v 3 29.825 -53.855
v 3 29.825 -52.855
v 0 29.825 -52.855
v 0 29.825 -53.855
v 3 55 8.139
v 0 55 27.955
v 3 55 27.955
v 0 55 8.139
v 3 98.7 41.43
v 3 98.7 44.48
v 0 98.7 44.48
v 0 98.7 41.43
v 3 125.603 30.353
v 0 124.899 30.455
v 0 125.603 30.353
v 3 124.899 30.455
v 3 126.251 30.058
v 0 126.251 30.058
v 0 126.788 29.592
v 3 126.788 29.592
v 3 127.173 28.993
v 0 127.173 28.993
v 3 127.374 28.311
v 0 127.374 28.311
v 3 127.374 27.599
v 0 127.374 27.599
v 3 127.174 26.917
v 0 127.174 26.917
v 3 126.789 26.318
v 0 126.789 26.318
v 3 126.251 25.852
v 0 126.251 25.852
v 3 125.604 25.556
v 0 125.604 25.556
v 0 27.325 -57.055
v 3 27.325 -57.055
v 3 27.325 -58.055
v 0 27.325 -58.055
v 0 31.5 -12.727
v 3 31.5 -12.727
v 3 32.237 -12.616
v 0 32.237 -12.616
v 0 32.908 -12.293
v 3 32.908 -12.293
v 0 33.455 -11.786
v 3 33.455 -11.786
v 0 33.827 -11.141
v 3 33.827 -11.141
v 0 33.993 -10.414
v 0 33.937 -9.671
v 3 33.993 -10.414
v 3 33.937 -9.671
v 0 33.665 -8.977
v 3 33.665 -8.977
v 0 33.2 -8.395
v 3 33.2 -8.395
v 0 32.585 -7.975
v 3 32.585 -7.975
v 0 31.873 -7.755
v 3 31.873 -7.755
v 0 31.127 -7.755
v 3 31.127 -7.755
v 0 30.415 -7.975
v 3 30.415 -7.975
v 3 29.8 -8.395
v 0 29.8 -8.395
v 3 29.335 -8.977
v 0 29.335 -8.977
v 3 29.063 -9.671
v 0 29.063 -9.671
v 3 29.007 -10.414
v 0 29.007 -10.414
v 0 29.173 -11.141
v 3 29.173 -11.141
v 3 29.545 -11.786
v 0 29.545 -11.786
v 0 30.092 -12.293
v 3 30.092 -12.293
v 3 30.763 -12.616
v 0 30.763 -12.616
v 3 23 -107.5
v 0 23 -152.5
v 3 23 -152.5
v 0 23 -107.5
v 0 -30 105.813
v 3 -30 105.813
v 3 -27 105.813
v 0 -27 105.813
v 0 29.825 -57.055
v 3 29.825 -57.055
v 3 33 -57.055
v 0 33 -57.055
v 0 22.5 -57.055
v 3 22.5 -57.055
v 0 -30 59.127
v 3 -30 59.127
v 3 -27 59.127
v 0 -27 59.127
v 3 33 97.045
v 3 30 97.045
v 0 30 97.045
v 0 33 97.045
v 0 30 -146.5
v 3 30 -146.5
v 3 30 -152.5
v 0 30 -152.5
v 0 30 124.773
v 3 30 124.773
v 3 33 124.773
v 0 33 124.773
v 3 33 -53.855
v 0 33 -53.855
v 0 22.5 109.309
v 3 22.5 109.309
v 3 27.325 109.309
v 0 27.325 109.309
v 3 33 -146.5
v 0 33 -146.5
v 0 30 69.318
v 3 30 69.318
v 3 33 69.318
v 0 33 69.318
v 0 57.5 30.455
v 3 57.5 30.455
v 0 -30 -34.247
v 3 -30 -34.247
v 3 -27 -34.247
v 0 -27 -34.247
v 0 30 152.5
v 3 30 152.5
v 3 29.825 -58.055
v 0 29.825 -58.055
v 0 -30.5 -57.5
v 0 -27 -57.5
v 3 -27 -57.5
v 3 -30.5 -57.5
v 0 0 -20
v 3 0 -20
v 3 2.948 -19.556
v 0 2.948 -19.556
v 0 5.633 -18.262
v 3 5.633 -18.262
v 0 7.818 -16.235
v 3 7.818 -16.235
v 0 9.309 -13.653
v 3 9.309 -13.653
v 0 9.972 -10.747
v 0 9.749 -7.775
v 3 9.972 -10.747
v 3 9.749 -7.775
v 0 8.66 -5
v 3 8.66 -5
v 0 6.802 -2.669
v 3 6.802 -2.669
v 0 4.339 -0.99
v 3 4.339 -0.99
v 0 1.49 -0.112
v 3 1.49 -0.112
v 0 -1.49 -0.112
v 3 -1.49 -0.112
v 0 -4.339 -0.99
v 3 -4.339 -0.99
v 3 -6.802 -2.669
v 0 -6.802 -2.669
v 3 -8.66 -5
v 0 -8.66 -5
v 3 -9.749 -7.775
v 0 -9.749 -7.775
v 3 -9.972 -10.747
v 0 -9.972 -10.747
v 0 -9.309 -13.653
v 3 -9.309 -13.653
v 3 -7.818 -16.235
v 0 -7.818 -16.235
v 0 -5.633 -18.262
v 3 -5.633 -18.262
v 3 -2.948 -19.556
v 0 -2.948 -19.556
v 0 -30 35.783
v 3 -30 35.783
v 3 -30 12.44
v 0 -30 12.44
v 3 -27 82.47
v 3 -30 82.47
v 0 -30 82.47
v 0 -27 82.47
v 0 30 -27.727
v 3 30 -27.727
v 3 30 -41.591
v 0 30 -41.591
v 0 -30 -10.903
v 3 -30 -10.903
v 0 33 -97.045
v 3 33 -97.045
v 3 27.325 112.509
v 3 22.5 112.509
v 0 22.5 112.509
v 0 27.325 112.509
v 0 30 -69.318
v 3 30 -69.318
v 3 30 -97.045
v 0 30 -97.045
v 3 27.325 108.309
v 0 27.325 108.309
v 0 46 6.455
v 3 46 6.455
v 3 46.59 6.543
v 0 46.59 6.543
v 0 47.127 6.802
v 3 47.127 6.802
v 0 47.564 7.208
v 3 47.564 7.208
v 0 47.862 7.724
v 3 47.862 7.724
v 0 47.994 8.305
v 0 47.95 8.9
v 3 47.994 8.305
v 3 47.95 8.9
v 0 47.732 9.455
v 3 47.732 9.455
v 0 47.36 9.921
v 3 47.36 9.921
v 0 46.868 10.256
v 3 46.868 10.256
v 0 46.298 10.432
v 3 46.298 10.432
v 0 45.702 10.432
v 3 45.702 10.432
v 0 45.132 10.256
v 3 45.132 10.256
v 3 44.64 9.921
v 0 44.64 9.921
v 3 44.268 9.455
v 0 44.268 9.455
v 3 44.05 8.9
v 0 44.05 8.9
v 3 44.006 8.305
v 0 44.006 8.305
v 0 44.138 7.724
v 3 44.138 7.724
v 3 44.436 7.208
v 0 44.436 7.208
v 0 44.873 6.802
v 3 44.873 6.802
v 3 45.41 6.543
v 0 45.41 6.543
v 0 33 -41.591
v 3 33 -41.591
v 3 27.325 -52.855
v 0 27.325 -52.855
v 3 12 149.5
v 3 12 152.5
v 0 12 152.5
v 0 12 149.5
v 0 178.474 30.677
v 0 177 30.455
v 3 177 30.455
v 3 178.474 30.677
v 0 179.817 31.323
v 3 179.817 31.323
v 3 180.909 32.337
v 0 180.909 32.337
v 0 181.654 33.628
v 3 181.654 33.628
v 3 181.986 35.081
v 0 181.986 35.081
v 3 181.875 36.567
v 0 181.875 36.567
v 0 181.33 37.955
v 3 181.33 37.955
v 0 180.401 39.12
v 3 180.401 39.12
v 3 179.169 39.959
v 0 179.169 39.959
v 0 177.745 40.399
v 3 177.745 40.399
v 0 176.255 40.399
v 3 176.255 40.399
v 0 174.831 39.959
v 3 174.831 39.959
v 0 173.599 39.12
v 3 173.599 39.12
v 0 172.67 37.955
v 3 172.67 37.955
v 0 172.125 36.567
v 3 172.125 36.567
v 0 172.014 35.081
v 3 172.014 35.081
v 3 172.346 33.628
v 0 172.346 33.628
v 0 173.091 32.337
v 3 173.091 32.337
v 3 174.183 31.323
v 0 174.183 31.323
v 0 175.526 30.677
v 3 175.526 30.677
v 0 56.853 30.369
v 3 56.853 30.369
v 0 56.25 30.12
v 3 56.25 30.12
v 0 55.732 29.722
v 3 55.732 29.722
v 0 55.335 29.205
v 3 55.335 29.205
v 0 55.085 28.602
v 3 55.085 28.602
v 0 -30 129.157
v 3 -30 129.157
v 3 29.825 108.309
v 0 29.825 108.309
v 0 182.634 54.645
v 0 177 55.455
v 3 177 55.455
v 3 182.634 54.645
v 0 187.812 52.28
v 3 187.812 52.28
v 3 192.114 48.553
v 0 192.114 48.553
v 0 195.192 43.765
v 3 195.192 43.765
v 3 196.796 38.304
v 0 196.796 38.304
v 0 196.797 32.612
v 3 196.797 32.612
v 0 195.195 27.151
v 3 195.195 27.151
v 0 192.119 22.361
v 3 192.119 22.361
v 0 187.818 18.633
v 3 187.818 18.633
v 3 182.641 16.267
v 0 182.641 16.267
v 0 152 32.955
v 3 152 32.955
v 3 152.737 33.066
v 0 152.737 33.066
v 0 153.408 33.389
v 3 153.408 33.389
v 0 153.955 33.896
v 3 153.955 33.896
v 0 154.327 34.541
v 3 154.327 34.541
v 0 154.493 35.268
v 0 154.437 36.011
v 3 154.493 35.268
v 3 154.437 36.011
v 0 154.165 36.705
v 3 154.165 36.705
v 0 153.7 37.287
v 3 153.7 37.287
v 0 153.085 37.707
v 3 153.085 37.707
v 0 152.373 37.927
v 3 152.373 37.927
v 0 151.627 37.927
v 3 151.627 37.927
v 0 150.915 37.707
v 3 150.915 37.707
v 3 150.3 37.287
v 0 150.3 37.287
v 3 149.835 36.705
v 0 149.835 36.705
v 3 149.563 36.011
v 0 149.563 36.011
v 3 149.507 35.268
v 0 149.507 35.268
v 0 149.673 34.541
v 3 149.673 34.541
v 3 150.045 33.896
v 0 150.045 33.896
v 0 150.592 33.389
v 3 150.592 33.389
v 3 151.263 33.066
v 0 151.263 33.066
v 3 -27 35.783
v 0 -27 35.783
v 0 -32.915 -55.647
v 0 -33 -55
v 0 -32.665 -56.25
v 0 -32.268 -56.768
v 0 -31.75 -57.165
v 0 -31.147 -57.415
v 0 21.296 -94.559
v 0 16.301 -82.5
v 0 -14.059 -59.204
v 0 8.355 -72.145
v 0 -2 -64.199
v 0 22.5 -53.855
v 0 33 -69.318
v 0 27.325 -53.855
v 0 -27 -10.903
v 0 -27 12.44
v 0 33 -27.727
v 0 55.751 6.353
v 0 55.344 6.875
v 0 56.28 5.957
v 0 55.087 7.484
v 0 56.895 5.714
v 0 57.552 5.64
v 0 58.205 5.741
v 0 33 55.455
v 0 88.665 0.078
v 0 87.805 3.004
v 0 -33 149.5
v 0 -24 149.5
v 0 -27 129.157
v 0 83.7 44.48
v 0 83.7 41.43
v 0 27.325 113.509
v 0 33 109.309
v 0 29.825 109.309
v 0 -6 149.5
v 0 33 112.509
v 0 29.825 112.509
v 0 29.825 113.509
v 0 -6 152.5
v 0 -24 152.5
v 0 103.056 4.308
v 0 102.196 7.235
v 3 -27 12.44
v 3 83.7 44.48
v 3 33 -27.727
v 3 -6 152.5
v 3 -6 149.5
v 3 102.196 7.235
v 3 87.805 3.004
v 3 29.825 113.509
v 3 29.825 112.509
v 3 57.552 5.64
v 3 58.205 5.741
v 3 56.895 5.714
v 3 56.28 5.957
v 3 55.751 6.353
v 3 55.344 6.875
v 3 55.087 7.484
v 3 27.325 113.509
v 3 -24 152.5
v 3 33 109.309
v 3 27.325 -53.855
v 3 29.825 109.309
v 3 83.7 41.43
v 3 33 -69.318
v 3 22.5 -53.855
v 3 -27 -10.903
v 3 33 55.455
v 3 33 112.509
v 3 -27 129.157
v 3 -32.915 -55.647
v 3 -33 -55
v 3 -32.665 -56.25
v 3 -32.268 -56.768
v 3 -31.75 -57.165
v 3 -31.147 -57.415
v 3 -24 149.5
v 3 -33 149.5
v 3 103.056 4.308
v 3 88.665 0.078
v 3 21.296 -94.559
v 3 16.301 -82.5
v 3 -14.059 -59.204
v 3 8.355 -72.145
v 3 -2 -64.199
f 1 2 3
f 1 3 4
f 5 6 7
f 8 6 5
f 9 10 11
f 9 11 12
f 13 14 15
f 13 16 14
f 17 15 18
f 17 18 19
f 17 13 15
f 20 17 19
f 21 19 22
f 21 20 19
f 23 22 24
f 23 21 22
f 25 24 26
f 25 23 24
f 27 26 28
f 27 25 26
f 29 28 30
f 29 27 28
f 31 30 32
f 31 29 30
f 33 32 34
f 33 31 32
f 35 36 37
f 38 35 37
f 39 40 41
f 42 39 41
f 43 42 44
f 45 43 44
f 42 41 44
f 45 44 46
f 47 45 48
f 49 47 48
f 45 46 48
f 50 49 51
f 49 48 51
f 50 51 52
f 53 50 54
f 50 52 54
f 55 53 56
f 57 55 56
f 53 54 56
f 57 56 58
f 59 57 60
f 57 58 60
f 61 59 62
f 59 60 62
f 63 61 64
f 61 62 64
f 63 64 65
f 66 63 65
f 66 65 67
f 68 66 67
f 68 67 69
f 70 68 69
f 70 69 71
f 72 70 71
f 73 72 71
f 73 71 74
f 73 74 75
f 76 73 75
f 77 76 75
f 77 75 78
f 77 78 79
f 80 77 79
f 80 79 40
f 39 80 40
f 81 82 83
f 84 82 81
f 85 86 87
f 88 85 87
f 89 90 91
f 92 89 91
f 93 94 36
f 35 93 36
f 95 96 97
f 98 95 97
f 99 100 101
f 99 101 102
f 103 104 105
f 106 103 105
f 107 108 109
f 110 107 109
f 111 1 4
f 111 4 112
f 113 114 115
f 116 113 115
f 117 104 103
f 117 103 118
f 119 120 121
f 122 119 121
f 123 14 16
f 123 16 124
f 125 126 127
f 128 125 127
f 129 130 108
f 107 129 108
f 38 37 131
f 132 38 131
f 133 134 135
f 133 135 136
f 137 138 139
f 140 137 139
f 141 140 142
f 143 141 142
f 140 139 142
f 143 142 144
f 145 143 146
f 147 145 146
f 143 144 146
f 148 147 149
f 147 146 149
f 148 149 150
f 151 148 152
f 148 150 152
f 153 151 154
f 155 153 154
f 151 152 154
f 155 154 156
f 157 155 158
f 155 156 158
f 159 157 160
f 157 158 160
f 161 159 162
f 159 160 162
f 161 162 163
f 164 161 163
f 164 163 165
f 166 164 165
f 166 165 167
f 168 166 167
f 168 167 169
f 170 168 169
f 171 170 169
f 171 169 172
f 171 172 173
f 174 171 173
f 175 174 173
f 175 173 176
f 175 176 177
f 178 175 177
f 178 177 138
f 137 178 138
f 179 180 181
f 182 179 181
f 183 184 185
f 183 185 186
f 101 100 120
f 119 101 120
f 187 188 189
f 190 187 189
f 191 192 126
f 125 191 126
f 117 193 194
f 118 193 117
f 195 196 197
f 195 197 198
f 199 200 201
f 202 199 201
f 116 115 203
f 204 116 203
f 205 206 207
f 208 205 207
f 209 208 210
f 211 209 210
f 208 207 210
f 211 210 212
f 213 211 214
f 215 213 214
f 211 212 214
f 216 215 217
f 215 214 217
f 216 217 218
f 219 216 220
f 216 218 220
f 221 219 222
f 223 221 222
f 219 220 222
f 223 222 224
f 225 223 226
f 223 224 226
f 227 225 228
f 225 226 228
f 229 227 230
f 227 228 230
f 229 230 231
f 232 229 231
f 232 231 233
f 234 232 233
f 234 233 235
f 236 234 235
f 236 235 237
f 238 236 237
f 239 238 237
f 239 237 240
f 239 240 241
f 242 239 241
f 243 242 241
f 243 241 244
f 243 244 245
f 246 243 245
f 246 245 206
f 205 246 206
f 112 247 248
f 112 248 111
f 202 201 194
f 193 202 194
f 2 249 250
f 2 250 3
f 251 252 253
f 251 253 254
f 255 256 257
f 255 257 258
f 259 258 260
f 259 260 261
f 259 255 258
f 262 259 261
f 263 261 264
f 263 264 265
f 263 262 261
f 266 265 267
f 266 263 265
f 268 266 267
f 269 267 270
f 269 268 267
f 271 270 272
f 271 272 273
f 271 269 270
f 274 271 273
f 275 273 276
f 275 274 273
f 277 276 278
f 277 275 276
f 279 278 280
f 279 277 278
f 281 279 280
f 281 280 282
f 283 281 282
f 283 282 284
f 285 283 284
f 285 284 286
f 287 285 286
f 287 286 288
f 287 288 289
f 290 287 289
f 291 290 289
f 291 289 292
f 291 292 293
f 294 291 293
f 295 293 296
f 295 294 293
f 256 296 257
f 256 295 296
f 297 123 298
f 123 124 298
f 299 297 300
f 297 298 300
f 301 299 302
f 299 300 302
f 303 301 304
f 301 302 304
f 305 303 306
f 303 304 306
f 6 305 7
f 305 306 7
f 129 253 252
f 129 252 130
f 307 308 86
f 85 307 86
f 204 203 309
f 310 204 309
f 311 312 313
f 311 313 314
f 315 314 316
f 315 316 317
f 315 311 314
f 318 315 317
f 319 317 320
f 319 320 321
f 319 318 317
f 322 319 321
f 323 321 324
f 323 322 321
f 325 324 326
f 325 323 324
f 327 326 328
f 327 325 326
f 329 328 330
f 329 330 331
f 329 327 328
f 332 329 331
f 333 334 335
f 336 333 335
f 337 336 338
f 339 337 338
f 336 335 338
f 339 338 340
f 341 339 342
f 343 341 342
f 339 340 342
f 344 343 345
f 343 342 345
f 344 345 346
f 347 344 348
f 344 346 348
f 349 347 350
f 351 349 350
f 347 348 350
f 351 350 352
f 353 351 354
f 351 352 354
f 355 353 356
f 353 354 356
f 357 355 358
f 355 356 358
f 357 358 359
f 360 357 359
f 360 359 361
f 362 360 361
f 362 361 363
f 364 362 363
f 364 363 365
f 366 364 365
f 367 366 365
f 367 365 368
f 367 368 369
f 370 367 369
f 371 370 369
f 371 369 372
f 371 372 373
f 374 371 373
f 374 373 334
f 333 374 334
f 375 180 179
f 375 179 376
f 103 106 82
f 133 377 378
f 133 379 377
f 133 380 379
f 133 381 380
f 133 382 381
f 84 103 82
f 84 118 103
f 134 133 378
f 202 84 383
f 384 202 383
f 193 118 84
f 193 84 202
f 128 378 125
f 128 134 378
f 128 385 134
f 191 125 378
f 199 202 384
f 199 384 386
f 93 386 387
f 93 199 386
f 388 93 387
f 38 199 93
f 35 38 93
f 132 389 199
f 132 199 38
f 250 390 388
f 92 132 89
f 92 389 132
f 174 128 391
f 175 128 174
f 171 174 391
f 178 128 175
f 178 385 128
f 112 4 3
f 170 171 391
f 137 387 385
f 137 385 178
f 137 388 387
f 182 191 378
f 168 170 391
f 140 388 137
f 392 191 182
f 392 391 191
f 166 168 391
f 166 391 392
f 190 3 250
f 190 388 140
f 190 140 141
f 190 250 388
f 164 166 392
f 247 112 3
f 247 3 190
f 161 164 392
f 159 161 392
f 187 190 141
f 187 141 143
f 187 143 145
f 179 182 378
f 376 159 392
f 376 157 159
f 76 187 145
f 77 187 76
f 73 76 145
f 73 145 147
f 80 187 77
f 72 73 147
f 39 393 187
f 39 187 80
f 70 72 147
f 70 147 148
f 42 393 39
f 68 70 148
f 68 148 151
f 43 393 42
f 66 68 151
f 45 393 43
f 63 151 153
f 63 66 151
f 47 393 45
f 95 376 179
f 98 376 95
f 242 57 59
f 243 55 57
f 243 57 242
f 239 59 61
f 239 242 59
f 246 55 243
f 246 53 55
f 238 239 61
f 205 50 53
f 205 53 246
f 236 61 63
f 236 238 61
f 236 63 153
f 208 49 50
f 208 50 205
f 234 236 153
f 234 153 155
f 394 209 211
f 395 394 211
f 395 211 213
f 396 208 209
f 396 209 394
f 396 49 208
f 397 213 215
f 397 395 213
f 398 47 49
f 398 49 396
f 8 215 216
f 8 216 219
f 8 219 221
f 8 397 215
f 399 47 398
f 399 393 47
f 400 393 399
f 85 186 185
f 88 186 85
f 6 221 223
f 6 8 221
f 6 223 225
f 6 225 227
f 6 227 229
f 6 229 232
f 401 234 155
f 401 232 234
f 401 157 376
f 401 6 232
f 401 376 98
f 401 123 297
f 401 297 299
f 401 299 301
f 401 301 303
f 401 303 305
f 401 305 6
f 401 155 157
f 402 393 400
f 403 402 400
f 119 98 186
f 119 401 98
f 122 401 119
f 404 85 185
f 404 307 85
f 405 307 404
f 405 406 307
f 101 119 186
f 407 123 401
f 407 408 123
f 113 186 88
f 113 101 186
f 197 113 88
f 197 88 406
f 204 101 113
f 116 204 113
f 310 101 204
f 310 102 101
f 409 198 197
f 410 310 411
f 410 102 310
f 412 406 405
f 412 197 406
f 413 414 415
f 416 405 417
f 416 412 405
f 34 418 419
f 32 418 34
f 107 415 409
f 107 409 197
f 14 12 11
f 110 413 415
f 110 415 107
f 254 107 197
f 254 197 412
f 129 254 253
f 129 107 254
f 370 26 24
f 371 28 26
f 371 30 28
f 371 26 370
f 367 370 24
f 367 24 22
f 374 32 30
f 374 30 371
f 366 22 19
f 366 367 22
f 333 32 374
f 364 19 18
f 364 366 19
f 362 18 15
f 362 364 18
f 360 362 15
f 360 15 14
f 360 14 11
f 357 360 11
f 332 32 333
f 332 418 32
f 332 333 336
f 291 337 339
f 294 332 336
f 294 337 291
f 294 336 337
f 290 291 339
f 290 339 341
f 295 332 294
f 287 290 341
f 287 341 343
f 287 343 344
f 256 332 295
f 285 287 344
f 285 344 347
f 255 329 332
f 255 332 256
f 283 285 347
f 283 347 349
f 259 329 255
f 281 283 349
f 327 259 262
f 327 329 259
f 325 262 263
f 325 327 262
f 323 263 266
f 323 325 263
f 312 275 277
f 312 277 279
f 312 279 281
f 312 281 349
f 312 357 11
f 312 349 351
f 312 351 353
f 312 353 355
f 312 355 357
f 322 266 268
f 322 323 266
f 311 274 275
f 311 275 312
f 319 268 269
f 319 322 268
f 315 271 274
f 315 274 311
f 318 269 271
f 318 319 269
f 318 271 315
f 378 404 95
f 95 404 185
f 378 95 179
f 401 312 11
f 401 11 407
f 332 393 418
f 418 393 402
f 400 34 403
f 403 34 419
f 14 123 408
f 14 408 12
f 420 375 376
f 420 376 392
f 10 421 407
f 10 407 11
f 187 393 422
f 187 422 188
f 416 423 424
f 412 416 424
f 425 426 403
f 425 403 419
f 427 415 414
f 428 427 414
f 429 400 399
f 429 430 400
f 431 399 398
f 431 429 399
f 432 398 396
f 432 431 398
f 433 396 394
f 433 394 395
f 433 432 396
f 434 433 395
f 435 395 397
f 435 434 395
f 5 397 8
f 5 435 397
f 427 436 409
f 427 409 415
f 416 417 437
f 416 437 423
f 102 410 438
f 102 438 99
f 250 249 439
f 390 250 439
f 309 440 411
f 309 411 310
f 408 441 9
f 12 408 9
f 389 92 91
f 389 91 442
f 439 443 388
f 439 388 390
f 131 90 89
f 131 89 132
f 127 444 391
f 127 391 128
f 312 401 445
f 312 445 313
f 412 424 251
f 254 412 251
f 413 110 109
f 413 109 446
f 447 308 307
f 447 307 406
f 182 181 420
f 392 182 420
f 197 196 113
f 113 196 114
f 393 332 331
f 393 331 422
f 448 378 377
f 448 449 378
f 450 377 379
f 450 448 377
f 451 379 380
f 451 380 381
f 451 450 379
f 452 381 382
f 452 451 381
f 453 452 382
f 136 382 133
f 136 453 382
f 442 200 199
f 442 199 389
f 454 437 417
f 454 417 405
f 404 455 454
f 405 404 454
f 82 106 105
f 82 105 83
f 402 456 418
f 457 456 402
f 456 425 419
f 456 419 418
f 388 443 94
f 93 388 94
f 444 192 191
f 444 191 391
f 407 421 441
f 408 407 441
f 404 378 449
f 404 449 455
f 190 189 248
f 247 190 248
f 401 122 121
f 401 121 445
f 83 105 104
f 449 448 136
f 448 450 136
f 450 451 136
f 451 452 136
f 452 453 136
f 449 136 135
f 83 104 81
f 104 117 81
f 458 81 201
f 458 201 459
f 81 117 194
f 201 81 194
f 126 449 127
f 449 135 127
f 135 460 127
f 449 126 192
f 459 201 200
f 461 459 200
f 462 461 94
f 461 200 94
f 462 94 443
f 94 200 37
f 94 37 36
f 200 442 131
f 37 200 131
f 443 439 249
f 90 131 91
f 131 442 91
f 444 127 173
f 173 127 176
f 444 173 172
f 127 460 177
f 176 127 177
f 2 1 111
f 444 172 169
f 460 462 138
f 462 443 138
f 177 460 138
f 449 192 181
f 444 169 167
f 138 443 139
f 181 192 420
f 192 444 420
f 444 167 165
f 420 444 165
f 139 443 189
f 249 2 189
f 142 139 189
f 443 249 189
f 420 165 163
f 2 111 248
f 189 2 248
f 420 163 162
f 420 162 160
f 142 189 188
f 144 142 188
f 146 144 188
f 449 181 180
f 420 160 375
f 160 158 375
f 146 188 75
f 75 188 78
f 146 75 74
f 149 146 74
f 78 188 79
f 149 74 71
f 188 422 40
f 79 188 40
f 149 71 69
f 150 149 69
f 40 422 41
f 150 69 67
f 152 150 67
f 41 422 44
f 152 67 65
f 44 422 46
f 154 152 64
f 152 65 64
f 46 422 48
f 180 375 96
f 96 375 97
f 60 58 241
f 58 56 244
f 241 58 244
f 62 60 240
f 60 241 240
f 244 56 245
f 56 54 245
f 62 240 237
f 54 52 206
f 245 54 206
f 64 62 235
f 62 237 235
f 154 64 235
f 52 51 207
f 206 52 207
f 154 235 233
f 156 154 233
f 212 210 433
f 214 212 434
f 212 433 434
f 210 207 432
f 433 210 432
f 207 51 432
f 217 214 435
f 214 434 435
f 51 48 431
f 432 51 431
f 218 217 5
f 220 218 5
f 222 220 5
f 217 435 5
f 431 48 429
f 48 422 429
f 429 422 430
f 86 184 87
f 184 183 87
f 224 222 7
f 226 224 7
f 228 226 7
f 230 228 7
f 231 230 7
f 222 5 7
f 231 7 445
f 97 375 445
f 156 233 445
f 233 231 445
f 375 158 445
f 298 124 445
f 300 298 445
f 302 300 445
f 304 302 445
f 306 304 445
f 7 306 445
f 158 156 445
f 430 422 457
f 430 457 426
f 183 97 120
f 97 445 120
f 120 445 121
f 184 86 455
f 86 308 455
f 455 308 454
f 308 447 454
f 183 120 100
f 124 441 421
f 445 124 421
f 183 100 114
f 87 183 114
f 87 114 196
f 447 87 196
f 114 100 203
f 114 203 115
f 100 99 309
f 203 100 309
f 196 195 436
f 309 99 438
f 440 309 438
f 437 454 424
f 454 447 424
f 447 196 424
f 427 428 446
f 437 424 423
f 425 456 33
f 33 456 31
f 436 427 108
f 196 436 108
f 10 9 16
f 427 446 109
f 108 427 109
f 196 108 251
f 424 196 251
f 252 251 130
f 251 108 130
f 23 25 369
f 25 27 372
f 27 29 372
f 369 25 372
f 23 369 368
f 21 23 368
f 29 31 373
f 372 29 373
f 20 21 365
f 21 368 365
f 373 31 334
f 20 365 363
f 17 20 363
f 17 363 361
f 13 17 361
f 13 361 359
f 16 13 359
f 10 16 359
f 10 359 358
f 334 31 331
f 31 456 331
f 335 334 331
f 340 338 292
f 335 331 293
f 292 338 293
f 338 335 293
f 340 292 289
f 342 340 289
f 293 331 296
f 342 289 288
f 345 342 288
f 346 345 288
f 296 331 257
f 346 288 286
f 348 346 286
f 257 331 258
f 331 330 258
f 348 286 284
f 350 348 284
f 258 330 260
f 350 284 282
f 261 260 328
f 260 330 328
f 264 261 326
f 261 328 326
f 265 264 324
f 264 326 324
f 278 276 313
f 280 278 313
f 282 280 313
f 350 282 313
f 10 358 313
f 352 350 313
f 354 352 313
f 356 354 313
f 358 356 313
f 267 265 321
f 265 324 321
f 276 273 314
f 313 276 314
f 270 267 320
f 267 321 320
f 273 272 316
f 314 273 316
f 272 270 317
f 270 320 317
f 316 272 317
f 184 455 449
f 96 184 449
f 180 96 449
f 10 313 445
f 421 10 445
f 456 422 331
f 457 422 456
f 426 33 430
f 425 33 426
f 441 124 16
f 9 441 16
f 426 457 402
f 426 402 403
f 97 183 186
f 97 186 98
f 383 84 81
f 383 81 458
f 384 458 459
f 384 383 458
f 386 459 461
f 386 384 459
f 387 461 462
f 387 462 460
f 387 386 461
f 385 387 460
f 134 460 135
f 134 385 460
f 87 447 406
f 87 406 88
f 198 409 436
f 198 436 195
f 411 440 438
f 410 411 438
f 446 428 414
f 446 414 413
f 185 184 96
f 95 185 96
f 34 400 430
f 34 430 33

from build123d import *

# Parameters (mm, degrees)
BOSS_EXTRUDE1_DEPTH     = 3
SKETCH2_W               = 27.727272727
SKETCH2_H               = 3
SKETCH2_W_2             = 3
SKETCH2_H_2             = 18
SKETCH2_H_3             = 9
SKETCH2_W_3             = 23.343342349
SKETCH2_W_4             = 23.34334235
SKETCH2_W_5             = 6
CUT_EXTRUDE1_DEPTH      = 1
CUT_EXTRUDE1_DEPTH_BACK = 4
SKETCH3_W               = 3.2
SKETCH3_H               = 10.5
SKETCH3_W_2             = 5.2
SKETCH3_H_2             = 2.5
CUT_EXTRUDE2_DEPTH      = 1
CUT_EXTRUDE2_DEPTH_BACK = 4
FILLET1_R               = 2.5
SKETCH4_R               = 5
BOSS_EXTRUDE2_DEPTH     = 3
FILLET2_R               = 2.5
SKETCH5_R               = 2.5
SKETCH5_R_2             = 2
SKETCH5_R_3             = 10
SKETCH5_W               = 3.05
SKETCH5_H               = 15
CUT_EXTRUDE3_DEPTH      = 1
CUT_EXTRUDE3_DEPTH_BACK = 4


with BuildPart() as part:
    # Sketch1 → Boss-Extrude1 (new body)
    with BuildSketch(Plane(origin=(0, 0, 0), x_dir=(0, 0, -1), z_dir=(1, 0, 0))):
        with BuildLine():
            Line((-152.5, 33), (152.5, 33))
            Line((152.5, 33), (152.5, 23))
            Line((152.5, 23), (107.5, 23))
            ThreePointArc((107.5, 23), (72.144660941, 8.355339059), (57.5, -27))
            Line((57.5, -27), (57.5, -33))
            Line((57.5, -33), (-152.5, -33))
            Line((-152.5, -33), (-152.5, 33))
        make_face()
    extrude(amount=BOSS_EXTRUDE1_DEPTH)

    # Sketch2 → Cut-Extrude1 (cut, two sides)
    with BuildSketch(Plane(origin=(3, 0, 0), x_dir=(0, 0, -1), z_dir=(1, 0, 0))) as cut_extrude1_sk:
        with Locations((27.727272728, 31.5)):
            Rectangle(SKETCH2_W, SKETCH2_H)
        with Locations((83.181818182, 31.5)):
            Rectangle(SKETCH2_W, SKETCH2_H)
        with Locations((-138.636363636, 31.5)):
            Rectangle(SKETCH2_W, SKETCH2_H)
        with Locations((-83.181818182, 31.5)):
            Rectangle(SKETCH2_W, SKETCH2_H)
        with Locations((-27.727272728, 31.5)):
            Rectangle(SKETCH2_W, SKETCH2_H)
        with Locations((-151, 3)):
            Rectangle(SKETCH2_W_2, SKETCH2_H_2)
        with Locations((-151, -28.5)):
            Rectangle(SKETCH2_W_2, SKETCH2_H_3)
        with Locations((-117.484986475, -28.5)):
            Rectangle(SKETCH2_W_3, SKETCH2_H)
        with Locations((-70.798301777, -28.5)):
            Rectangle(SKETCH2_W_3, SKETCH2_H)
        with Locations((22.575067622, -28.5)):
            Rectangle(SKETCH2_W_4, SKETCH2_H)
        with Locations((149.5, 31.5)):
            Rectangle(SKETCH2_W_5, SKETCH2_H)
        with Locations((-24.111617078, -28.5)):
            Rectangle(SKETCH2_W_3, SKETCH2_H)
    extrude(amount=CUT_EXTRUDE1_DEPTH, mode=Mode.SUBTRACT)
    extrude(cut_extrude1_sk.sketch, amount=-CUT_EXTRUDE1_DEPTH_BACK, mode=Mode.SUBTRACT)

    # Sketch3 → Cut-Extrude2 (cut, two sides)
    with BuildSketch(Plane(origin=(3, 0, 0), x_dir=(0, 0, -1), z_dir=(1, 0, 0))) as cut_extrude2_sk:
        with Locations((-110.909090909, 27.75)):
            Rectangle(SKETCH3_W, SKETCH3_H)
        with Locations((55.454545455, 27.75)):
            Rectangle(SKETCH3_W, SKETCH3_H)
        with Locations((55.454545455, 28.575)):
            Rectangle(SKETCH3_W_2, SKETCH3_H_2)
        with Locations((-110.909090909, 28.575)):
            Rectangle(SKETCH3_W_2, SKETCH3_H_2)
    extrude(amount=CUT_EXTRUDE2_DEPTH, mode=Mode.SUBTRACT)
    extrude(cut_extrude2_sk.sketch, amount=-CUT_EXTRUDE2_DEPTH_BACK, mode=Mode.SUBTRACT)

    # Fillet1
    fillet1_edges = [part.edges().sort_by_distance(p)[0] for p in [
        (1.5, -33, -57.5),
    ]]
    fillet(fillet1_edges, radius=FILLET1_R)

    # Sketch4 → Boss-Extrude2 (add)
    with BuildSketch(Plane(origin=(0, 0, 0), x_dir=(0, 0, -1), z_dir=(1, 0, 0))):
        with BuildLine():
            Line((-55.454545455, 30), (-55.454545455, 177))
            ThreePointArc((-55.454545455, 177), (-38.304207087, 196.795944751), (-16.266602596, 182.641174423))
            Line((-16.266602596, 182.641174423), (27.727272727, 33))
            Line((27.727272727, 33), (27.727272727, 30))
            Line((27.727272727, 30), (-55.454545455, 30))
        make_face()
        with Locations((-35.454545455, 177)):
            Circle(SKETCH4_R, mode=Mode.SUBTRACT)
        Polygon((-30.454545455, 55), (-4.798665146, 55), (-30.454545455, 142.266148573), align=None, mode=Mode.SUBTRACT)
    extrude(amount=BOSS_EXTRUDE2_DEPTH)

    # Fillet2
    fillet2_edges = [part.edges().sort_by_distance(p)[0] for p in [
        (1.5, 55, 30.454545455),
        (1.5, 55, 4.798665146),
        (1.5, 142.266148573, 30.454545455),
    ]]
    fillet(fillet2_edges, radius=FILLET2_R)

    # Sketch5 → Cut-Extrude3 (cut, two sides)
    with BuildSketch(Plane(origin=(3, 0, 0), x_dir=(0, 0, -1), z_dir=(1, 0, 0))) as cut_extrude3_sk:
        with Locations((10.227172727, 31.5)):
            Circle(SKETCH5_R)
        with Locations((-35.454545455, 152)):
            Circle(SKETCH5_R)
        with Locations((-8.454545455, 46)):
            Circle(SKETCH5_R_2)
        with Locations((10, 0)):
            Circle(SKETCH5_R_3)
        Polygon((-3.003684653, 87.804874126), (-7.23456547, 102.195831269), (-4.308404184, 103.056110369), (-0.077523367, 88.665153225), align=None)
        with Locations((-42.954545455, 91.19961143)):
            Rectangle(SKETCH5_W, SKETCH5_H)
    extrude(amount=CUT_EXTRUDE3_DEPTH, mode=Mode.SUBTRACT)
    extrude(cut_extrude3_sk.sketch, amount=-CUT_EXTRUDE3_DEPTH_BACK, mode=Mode.SUBTRACT)


solid = part.part
